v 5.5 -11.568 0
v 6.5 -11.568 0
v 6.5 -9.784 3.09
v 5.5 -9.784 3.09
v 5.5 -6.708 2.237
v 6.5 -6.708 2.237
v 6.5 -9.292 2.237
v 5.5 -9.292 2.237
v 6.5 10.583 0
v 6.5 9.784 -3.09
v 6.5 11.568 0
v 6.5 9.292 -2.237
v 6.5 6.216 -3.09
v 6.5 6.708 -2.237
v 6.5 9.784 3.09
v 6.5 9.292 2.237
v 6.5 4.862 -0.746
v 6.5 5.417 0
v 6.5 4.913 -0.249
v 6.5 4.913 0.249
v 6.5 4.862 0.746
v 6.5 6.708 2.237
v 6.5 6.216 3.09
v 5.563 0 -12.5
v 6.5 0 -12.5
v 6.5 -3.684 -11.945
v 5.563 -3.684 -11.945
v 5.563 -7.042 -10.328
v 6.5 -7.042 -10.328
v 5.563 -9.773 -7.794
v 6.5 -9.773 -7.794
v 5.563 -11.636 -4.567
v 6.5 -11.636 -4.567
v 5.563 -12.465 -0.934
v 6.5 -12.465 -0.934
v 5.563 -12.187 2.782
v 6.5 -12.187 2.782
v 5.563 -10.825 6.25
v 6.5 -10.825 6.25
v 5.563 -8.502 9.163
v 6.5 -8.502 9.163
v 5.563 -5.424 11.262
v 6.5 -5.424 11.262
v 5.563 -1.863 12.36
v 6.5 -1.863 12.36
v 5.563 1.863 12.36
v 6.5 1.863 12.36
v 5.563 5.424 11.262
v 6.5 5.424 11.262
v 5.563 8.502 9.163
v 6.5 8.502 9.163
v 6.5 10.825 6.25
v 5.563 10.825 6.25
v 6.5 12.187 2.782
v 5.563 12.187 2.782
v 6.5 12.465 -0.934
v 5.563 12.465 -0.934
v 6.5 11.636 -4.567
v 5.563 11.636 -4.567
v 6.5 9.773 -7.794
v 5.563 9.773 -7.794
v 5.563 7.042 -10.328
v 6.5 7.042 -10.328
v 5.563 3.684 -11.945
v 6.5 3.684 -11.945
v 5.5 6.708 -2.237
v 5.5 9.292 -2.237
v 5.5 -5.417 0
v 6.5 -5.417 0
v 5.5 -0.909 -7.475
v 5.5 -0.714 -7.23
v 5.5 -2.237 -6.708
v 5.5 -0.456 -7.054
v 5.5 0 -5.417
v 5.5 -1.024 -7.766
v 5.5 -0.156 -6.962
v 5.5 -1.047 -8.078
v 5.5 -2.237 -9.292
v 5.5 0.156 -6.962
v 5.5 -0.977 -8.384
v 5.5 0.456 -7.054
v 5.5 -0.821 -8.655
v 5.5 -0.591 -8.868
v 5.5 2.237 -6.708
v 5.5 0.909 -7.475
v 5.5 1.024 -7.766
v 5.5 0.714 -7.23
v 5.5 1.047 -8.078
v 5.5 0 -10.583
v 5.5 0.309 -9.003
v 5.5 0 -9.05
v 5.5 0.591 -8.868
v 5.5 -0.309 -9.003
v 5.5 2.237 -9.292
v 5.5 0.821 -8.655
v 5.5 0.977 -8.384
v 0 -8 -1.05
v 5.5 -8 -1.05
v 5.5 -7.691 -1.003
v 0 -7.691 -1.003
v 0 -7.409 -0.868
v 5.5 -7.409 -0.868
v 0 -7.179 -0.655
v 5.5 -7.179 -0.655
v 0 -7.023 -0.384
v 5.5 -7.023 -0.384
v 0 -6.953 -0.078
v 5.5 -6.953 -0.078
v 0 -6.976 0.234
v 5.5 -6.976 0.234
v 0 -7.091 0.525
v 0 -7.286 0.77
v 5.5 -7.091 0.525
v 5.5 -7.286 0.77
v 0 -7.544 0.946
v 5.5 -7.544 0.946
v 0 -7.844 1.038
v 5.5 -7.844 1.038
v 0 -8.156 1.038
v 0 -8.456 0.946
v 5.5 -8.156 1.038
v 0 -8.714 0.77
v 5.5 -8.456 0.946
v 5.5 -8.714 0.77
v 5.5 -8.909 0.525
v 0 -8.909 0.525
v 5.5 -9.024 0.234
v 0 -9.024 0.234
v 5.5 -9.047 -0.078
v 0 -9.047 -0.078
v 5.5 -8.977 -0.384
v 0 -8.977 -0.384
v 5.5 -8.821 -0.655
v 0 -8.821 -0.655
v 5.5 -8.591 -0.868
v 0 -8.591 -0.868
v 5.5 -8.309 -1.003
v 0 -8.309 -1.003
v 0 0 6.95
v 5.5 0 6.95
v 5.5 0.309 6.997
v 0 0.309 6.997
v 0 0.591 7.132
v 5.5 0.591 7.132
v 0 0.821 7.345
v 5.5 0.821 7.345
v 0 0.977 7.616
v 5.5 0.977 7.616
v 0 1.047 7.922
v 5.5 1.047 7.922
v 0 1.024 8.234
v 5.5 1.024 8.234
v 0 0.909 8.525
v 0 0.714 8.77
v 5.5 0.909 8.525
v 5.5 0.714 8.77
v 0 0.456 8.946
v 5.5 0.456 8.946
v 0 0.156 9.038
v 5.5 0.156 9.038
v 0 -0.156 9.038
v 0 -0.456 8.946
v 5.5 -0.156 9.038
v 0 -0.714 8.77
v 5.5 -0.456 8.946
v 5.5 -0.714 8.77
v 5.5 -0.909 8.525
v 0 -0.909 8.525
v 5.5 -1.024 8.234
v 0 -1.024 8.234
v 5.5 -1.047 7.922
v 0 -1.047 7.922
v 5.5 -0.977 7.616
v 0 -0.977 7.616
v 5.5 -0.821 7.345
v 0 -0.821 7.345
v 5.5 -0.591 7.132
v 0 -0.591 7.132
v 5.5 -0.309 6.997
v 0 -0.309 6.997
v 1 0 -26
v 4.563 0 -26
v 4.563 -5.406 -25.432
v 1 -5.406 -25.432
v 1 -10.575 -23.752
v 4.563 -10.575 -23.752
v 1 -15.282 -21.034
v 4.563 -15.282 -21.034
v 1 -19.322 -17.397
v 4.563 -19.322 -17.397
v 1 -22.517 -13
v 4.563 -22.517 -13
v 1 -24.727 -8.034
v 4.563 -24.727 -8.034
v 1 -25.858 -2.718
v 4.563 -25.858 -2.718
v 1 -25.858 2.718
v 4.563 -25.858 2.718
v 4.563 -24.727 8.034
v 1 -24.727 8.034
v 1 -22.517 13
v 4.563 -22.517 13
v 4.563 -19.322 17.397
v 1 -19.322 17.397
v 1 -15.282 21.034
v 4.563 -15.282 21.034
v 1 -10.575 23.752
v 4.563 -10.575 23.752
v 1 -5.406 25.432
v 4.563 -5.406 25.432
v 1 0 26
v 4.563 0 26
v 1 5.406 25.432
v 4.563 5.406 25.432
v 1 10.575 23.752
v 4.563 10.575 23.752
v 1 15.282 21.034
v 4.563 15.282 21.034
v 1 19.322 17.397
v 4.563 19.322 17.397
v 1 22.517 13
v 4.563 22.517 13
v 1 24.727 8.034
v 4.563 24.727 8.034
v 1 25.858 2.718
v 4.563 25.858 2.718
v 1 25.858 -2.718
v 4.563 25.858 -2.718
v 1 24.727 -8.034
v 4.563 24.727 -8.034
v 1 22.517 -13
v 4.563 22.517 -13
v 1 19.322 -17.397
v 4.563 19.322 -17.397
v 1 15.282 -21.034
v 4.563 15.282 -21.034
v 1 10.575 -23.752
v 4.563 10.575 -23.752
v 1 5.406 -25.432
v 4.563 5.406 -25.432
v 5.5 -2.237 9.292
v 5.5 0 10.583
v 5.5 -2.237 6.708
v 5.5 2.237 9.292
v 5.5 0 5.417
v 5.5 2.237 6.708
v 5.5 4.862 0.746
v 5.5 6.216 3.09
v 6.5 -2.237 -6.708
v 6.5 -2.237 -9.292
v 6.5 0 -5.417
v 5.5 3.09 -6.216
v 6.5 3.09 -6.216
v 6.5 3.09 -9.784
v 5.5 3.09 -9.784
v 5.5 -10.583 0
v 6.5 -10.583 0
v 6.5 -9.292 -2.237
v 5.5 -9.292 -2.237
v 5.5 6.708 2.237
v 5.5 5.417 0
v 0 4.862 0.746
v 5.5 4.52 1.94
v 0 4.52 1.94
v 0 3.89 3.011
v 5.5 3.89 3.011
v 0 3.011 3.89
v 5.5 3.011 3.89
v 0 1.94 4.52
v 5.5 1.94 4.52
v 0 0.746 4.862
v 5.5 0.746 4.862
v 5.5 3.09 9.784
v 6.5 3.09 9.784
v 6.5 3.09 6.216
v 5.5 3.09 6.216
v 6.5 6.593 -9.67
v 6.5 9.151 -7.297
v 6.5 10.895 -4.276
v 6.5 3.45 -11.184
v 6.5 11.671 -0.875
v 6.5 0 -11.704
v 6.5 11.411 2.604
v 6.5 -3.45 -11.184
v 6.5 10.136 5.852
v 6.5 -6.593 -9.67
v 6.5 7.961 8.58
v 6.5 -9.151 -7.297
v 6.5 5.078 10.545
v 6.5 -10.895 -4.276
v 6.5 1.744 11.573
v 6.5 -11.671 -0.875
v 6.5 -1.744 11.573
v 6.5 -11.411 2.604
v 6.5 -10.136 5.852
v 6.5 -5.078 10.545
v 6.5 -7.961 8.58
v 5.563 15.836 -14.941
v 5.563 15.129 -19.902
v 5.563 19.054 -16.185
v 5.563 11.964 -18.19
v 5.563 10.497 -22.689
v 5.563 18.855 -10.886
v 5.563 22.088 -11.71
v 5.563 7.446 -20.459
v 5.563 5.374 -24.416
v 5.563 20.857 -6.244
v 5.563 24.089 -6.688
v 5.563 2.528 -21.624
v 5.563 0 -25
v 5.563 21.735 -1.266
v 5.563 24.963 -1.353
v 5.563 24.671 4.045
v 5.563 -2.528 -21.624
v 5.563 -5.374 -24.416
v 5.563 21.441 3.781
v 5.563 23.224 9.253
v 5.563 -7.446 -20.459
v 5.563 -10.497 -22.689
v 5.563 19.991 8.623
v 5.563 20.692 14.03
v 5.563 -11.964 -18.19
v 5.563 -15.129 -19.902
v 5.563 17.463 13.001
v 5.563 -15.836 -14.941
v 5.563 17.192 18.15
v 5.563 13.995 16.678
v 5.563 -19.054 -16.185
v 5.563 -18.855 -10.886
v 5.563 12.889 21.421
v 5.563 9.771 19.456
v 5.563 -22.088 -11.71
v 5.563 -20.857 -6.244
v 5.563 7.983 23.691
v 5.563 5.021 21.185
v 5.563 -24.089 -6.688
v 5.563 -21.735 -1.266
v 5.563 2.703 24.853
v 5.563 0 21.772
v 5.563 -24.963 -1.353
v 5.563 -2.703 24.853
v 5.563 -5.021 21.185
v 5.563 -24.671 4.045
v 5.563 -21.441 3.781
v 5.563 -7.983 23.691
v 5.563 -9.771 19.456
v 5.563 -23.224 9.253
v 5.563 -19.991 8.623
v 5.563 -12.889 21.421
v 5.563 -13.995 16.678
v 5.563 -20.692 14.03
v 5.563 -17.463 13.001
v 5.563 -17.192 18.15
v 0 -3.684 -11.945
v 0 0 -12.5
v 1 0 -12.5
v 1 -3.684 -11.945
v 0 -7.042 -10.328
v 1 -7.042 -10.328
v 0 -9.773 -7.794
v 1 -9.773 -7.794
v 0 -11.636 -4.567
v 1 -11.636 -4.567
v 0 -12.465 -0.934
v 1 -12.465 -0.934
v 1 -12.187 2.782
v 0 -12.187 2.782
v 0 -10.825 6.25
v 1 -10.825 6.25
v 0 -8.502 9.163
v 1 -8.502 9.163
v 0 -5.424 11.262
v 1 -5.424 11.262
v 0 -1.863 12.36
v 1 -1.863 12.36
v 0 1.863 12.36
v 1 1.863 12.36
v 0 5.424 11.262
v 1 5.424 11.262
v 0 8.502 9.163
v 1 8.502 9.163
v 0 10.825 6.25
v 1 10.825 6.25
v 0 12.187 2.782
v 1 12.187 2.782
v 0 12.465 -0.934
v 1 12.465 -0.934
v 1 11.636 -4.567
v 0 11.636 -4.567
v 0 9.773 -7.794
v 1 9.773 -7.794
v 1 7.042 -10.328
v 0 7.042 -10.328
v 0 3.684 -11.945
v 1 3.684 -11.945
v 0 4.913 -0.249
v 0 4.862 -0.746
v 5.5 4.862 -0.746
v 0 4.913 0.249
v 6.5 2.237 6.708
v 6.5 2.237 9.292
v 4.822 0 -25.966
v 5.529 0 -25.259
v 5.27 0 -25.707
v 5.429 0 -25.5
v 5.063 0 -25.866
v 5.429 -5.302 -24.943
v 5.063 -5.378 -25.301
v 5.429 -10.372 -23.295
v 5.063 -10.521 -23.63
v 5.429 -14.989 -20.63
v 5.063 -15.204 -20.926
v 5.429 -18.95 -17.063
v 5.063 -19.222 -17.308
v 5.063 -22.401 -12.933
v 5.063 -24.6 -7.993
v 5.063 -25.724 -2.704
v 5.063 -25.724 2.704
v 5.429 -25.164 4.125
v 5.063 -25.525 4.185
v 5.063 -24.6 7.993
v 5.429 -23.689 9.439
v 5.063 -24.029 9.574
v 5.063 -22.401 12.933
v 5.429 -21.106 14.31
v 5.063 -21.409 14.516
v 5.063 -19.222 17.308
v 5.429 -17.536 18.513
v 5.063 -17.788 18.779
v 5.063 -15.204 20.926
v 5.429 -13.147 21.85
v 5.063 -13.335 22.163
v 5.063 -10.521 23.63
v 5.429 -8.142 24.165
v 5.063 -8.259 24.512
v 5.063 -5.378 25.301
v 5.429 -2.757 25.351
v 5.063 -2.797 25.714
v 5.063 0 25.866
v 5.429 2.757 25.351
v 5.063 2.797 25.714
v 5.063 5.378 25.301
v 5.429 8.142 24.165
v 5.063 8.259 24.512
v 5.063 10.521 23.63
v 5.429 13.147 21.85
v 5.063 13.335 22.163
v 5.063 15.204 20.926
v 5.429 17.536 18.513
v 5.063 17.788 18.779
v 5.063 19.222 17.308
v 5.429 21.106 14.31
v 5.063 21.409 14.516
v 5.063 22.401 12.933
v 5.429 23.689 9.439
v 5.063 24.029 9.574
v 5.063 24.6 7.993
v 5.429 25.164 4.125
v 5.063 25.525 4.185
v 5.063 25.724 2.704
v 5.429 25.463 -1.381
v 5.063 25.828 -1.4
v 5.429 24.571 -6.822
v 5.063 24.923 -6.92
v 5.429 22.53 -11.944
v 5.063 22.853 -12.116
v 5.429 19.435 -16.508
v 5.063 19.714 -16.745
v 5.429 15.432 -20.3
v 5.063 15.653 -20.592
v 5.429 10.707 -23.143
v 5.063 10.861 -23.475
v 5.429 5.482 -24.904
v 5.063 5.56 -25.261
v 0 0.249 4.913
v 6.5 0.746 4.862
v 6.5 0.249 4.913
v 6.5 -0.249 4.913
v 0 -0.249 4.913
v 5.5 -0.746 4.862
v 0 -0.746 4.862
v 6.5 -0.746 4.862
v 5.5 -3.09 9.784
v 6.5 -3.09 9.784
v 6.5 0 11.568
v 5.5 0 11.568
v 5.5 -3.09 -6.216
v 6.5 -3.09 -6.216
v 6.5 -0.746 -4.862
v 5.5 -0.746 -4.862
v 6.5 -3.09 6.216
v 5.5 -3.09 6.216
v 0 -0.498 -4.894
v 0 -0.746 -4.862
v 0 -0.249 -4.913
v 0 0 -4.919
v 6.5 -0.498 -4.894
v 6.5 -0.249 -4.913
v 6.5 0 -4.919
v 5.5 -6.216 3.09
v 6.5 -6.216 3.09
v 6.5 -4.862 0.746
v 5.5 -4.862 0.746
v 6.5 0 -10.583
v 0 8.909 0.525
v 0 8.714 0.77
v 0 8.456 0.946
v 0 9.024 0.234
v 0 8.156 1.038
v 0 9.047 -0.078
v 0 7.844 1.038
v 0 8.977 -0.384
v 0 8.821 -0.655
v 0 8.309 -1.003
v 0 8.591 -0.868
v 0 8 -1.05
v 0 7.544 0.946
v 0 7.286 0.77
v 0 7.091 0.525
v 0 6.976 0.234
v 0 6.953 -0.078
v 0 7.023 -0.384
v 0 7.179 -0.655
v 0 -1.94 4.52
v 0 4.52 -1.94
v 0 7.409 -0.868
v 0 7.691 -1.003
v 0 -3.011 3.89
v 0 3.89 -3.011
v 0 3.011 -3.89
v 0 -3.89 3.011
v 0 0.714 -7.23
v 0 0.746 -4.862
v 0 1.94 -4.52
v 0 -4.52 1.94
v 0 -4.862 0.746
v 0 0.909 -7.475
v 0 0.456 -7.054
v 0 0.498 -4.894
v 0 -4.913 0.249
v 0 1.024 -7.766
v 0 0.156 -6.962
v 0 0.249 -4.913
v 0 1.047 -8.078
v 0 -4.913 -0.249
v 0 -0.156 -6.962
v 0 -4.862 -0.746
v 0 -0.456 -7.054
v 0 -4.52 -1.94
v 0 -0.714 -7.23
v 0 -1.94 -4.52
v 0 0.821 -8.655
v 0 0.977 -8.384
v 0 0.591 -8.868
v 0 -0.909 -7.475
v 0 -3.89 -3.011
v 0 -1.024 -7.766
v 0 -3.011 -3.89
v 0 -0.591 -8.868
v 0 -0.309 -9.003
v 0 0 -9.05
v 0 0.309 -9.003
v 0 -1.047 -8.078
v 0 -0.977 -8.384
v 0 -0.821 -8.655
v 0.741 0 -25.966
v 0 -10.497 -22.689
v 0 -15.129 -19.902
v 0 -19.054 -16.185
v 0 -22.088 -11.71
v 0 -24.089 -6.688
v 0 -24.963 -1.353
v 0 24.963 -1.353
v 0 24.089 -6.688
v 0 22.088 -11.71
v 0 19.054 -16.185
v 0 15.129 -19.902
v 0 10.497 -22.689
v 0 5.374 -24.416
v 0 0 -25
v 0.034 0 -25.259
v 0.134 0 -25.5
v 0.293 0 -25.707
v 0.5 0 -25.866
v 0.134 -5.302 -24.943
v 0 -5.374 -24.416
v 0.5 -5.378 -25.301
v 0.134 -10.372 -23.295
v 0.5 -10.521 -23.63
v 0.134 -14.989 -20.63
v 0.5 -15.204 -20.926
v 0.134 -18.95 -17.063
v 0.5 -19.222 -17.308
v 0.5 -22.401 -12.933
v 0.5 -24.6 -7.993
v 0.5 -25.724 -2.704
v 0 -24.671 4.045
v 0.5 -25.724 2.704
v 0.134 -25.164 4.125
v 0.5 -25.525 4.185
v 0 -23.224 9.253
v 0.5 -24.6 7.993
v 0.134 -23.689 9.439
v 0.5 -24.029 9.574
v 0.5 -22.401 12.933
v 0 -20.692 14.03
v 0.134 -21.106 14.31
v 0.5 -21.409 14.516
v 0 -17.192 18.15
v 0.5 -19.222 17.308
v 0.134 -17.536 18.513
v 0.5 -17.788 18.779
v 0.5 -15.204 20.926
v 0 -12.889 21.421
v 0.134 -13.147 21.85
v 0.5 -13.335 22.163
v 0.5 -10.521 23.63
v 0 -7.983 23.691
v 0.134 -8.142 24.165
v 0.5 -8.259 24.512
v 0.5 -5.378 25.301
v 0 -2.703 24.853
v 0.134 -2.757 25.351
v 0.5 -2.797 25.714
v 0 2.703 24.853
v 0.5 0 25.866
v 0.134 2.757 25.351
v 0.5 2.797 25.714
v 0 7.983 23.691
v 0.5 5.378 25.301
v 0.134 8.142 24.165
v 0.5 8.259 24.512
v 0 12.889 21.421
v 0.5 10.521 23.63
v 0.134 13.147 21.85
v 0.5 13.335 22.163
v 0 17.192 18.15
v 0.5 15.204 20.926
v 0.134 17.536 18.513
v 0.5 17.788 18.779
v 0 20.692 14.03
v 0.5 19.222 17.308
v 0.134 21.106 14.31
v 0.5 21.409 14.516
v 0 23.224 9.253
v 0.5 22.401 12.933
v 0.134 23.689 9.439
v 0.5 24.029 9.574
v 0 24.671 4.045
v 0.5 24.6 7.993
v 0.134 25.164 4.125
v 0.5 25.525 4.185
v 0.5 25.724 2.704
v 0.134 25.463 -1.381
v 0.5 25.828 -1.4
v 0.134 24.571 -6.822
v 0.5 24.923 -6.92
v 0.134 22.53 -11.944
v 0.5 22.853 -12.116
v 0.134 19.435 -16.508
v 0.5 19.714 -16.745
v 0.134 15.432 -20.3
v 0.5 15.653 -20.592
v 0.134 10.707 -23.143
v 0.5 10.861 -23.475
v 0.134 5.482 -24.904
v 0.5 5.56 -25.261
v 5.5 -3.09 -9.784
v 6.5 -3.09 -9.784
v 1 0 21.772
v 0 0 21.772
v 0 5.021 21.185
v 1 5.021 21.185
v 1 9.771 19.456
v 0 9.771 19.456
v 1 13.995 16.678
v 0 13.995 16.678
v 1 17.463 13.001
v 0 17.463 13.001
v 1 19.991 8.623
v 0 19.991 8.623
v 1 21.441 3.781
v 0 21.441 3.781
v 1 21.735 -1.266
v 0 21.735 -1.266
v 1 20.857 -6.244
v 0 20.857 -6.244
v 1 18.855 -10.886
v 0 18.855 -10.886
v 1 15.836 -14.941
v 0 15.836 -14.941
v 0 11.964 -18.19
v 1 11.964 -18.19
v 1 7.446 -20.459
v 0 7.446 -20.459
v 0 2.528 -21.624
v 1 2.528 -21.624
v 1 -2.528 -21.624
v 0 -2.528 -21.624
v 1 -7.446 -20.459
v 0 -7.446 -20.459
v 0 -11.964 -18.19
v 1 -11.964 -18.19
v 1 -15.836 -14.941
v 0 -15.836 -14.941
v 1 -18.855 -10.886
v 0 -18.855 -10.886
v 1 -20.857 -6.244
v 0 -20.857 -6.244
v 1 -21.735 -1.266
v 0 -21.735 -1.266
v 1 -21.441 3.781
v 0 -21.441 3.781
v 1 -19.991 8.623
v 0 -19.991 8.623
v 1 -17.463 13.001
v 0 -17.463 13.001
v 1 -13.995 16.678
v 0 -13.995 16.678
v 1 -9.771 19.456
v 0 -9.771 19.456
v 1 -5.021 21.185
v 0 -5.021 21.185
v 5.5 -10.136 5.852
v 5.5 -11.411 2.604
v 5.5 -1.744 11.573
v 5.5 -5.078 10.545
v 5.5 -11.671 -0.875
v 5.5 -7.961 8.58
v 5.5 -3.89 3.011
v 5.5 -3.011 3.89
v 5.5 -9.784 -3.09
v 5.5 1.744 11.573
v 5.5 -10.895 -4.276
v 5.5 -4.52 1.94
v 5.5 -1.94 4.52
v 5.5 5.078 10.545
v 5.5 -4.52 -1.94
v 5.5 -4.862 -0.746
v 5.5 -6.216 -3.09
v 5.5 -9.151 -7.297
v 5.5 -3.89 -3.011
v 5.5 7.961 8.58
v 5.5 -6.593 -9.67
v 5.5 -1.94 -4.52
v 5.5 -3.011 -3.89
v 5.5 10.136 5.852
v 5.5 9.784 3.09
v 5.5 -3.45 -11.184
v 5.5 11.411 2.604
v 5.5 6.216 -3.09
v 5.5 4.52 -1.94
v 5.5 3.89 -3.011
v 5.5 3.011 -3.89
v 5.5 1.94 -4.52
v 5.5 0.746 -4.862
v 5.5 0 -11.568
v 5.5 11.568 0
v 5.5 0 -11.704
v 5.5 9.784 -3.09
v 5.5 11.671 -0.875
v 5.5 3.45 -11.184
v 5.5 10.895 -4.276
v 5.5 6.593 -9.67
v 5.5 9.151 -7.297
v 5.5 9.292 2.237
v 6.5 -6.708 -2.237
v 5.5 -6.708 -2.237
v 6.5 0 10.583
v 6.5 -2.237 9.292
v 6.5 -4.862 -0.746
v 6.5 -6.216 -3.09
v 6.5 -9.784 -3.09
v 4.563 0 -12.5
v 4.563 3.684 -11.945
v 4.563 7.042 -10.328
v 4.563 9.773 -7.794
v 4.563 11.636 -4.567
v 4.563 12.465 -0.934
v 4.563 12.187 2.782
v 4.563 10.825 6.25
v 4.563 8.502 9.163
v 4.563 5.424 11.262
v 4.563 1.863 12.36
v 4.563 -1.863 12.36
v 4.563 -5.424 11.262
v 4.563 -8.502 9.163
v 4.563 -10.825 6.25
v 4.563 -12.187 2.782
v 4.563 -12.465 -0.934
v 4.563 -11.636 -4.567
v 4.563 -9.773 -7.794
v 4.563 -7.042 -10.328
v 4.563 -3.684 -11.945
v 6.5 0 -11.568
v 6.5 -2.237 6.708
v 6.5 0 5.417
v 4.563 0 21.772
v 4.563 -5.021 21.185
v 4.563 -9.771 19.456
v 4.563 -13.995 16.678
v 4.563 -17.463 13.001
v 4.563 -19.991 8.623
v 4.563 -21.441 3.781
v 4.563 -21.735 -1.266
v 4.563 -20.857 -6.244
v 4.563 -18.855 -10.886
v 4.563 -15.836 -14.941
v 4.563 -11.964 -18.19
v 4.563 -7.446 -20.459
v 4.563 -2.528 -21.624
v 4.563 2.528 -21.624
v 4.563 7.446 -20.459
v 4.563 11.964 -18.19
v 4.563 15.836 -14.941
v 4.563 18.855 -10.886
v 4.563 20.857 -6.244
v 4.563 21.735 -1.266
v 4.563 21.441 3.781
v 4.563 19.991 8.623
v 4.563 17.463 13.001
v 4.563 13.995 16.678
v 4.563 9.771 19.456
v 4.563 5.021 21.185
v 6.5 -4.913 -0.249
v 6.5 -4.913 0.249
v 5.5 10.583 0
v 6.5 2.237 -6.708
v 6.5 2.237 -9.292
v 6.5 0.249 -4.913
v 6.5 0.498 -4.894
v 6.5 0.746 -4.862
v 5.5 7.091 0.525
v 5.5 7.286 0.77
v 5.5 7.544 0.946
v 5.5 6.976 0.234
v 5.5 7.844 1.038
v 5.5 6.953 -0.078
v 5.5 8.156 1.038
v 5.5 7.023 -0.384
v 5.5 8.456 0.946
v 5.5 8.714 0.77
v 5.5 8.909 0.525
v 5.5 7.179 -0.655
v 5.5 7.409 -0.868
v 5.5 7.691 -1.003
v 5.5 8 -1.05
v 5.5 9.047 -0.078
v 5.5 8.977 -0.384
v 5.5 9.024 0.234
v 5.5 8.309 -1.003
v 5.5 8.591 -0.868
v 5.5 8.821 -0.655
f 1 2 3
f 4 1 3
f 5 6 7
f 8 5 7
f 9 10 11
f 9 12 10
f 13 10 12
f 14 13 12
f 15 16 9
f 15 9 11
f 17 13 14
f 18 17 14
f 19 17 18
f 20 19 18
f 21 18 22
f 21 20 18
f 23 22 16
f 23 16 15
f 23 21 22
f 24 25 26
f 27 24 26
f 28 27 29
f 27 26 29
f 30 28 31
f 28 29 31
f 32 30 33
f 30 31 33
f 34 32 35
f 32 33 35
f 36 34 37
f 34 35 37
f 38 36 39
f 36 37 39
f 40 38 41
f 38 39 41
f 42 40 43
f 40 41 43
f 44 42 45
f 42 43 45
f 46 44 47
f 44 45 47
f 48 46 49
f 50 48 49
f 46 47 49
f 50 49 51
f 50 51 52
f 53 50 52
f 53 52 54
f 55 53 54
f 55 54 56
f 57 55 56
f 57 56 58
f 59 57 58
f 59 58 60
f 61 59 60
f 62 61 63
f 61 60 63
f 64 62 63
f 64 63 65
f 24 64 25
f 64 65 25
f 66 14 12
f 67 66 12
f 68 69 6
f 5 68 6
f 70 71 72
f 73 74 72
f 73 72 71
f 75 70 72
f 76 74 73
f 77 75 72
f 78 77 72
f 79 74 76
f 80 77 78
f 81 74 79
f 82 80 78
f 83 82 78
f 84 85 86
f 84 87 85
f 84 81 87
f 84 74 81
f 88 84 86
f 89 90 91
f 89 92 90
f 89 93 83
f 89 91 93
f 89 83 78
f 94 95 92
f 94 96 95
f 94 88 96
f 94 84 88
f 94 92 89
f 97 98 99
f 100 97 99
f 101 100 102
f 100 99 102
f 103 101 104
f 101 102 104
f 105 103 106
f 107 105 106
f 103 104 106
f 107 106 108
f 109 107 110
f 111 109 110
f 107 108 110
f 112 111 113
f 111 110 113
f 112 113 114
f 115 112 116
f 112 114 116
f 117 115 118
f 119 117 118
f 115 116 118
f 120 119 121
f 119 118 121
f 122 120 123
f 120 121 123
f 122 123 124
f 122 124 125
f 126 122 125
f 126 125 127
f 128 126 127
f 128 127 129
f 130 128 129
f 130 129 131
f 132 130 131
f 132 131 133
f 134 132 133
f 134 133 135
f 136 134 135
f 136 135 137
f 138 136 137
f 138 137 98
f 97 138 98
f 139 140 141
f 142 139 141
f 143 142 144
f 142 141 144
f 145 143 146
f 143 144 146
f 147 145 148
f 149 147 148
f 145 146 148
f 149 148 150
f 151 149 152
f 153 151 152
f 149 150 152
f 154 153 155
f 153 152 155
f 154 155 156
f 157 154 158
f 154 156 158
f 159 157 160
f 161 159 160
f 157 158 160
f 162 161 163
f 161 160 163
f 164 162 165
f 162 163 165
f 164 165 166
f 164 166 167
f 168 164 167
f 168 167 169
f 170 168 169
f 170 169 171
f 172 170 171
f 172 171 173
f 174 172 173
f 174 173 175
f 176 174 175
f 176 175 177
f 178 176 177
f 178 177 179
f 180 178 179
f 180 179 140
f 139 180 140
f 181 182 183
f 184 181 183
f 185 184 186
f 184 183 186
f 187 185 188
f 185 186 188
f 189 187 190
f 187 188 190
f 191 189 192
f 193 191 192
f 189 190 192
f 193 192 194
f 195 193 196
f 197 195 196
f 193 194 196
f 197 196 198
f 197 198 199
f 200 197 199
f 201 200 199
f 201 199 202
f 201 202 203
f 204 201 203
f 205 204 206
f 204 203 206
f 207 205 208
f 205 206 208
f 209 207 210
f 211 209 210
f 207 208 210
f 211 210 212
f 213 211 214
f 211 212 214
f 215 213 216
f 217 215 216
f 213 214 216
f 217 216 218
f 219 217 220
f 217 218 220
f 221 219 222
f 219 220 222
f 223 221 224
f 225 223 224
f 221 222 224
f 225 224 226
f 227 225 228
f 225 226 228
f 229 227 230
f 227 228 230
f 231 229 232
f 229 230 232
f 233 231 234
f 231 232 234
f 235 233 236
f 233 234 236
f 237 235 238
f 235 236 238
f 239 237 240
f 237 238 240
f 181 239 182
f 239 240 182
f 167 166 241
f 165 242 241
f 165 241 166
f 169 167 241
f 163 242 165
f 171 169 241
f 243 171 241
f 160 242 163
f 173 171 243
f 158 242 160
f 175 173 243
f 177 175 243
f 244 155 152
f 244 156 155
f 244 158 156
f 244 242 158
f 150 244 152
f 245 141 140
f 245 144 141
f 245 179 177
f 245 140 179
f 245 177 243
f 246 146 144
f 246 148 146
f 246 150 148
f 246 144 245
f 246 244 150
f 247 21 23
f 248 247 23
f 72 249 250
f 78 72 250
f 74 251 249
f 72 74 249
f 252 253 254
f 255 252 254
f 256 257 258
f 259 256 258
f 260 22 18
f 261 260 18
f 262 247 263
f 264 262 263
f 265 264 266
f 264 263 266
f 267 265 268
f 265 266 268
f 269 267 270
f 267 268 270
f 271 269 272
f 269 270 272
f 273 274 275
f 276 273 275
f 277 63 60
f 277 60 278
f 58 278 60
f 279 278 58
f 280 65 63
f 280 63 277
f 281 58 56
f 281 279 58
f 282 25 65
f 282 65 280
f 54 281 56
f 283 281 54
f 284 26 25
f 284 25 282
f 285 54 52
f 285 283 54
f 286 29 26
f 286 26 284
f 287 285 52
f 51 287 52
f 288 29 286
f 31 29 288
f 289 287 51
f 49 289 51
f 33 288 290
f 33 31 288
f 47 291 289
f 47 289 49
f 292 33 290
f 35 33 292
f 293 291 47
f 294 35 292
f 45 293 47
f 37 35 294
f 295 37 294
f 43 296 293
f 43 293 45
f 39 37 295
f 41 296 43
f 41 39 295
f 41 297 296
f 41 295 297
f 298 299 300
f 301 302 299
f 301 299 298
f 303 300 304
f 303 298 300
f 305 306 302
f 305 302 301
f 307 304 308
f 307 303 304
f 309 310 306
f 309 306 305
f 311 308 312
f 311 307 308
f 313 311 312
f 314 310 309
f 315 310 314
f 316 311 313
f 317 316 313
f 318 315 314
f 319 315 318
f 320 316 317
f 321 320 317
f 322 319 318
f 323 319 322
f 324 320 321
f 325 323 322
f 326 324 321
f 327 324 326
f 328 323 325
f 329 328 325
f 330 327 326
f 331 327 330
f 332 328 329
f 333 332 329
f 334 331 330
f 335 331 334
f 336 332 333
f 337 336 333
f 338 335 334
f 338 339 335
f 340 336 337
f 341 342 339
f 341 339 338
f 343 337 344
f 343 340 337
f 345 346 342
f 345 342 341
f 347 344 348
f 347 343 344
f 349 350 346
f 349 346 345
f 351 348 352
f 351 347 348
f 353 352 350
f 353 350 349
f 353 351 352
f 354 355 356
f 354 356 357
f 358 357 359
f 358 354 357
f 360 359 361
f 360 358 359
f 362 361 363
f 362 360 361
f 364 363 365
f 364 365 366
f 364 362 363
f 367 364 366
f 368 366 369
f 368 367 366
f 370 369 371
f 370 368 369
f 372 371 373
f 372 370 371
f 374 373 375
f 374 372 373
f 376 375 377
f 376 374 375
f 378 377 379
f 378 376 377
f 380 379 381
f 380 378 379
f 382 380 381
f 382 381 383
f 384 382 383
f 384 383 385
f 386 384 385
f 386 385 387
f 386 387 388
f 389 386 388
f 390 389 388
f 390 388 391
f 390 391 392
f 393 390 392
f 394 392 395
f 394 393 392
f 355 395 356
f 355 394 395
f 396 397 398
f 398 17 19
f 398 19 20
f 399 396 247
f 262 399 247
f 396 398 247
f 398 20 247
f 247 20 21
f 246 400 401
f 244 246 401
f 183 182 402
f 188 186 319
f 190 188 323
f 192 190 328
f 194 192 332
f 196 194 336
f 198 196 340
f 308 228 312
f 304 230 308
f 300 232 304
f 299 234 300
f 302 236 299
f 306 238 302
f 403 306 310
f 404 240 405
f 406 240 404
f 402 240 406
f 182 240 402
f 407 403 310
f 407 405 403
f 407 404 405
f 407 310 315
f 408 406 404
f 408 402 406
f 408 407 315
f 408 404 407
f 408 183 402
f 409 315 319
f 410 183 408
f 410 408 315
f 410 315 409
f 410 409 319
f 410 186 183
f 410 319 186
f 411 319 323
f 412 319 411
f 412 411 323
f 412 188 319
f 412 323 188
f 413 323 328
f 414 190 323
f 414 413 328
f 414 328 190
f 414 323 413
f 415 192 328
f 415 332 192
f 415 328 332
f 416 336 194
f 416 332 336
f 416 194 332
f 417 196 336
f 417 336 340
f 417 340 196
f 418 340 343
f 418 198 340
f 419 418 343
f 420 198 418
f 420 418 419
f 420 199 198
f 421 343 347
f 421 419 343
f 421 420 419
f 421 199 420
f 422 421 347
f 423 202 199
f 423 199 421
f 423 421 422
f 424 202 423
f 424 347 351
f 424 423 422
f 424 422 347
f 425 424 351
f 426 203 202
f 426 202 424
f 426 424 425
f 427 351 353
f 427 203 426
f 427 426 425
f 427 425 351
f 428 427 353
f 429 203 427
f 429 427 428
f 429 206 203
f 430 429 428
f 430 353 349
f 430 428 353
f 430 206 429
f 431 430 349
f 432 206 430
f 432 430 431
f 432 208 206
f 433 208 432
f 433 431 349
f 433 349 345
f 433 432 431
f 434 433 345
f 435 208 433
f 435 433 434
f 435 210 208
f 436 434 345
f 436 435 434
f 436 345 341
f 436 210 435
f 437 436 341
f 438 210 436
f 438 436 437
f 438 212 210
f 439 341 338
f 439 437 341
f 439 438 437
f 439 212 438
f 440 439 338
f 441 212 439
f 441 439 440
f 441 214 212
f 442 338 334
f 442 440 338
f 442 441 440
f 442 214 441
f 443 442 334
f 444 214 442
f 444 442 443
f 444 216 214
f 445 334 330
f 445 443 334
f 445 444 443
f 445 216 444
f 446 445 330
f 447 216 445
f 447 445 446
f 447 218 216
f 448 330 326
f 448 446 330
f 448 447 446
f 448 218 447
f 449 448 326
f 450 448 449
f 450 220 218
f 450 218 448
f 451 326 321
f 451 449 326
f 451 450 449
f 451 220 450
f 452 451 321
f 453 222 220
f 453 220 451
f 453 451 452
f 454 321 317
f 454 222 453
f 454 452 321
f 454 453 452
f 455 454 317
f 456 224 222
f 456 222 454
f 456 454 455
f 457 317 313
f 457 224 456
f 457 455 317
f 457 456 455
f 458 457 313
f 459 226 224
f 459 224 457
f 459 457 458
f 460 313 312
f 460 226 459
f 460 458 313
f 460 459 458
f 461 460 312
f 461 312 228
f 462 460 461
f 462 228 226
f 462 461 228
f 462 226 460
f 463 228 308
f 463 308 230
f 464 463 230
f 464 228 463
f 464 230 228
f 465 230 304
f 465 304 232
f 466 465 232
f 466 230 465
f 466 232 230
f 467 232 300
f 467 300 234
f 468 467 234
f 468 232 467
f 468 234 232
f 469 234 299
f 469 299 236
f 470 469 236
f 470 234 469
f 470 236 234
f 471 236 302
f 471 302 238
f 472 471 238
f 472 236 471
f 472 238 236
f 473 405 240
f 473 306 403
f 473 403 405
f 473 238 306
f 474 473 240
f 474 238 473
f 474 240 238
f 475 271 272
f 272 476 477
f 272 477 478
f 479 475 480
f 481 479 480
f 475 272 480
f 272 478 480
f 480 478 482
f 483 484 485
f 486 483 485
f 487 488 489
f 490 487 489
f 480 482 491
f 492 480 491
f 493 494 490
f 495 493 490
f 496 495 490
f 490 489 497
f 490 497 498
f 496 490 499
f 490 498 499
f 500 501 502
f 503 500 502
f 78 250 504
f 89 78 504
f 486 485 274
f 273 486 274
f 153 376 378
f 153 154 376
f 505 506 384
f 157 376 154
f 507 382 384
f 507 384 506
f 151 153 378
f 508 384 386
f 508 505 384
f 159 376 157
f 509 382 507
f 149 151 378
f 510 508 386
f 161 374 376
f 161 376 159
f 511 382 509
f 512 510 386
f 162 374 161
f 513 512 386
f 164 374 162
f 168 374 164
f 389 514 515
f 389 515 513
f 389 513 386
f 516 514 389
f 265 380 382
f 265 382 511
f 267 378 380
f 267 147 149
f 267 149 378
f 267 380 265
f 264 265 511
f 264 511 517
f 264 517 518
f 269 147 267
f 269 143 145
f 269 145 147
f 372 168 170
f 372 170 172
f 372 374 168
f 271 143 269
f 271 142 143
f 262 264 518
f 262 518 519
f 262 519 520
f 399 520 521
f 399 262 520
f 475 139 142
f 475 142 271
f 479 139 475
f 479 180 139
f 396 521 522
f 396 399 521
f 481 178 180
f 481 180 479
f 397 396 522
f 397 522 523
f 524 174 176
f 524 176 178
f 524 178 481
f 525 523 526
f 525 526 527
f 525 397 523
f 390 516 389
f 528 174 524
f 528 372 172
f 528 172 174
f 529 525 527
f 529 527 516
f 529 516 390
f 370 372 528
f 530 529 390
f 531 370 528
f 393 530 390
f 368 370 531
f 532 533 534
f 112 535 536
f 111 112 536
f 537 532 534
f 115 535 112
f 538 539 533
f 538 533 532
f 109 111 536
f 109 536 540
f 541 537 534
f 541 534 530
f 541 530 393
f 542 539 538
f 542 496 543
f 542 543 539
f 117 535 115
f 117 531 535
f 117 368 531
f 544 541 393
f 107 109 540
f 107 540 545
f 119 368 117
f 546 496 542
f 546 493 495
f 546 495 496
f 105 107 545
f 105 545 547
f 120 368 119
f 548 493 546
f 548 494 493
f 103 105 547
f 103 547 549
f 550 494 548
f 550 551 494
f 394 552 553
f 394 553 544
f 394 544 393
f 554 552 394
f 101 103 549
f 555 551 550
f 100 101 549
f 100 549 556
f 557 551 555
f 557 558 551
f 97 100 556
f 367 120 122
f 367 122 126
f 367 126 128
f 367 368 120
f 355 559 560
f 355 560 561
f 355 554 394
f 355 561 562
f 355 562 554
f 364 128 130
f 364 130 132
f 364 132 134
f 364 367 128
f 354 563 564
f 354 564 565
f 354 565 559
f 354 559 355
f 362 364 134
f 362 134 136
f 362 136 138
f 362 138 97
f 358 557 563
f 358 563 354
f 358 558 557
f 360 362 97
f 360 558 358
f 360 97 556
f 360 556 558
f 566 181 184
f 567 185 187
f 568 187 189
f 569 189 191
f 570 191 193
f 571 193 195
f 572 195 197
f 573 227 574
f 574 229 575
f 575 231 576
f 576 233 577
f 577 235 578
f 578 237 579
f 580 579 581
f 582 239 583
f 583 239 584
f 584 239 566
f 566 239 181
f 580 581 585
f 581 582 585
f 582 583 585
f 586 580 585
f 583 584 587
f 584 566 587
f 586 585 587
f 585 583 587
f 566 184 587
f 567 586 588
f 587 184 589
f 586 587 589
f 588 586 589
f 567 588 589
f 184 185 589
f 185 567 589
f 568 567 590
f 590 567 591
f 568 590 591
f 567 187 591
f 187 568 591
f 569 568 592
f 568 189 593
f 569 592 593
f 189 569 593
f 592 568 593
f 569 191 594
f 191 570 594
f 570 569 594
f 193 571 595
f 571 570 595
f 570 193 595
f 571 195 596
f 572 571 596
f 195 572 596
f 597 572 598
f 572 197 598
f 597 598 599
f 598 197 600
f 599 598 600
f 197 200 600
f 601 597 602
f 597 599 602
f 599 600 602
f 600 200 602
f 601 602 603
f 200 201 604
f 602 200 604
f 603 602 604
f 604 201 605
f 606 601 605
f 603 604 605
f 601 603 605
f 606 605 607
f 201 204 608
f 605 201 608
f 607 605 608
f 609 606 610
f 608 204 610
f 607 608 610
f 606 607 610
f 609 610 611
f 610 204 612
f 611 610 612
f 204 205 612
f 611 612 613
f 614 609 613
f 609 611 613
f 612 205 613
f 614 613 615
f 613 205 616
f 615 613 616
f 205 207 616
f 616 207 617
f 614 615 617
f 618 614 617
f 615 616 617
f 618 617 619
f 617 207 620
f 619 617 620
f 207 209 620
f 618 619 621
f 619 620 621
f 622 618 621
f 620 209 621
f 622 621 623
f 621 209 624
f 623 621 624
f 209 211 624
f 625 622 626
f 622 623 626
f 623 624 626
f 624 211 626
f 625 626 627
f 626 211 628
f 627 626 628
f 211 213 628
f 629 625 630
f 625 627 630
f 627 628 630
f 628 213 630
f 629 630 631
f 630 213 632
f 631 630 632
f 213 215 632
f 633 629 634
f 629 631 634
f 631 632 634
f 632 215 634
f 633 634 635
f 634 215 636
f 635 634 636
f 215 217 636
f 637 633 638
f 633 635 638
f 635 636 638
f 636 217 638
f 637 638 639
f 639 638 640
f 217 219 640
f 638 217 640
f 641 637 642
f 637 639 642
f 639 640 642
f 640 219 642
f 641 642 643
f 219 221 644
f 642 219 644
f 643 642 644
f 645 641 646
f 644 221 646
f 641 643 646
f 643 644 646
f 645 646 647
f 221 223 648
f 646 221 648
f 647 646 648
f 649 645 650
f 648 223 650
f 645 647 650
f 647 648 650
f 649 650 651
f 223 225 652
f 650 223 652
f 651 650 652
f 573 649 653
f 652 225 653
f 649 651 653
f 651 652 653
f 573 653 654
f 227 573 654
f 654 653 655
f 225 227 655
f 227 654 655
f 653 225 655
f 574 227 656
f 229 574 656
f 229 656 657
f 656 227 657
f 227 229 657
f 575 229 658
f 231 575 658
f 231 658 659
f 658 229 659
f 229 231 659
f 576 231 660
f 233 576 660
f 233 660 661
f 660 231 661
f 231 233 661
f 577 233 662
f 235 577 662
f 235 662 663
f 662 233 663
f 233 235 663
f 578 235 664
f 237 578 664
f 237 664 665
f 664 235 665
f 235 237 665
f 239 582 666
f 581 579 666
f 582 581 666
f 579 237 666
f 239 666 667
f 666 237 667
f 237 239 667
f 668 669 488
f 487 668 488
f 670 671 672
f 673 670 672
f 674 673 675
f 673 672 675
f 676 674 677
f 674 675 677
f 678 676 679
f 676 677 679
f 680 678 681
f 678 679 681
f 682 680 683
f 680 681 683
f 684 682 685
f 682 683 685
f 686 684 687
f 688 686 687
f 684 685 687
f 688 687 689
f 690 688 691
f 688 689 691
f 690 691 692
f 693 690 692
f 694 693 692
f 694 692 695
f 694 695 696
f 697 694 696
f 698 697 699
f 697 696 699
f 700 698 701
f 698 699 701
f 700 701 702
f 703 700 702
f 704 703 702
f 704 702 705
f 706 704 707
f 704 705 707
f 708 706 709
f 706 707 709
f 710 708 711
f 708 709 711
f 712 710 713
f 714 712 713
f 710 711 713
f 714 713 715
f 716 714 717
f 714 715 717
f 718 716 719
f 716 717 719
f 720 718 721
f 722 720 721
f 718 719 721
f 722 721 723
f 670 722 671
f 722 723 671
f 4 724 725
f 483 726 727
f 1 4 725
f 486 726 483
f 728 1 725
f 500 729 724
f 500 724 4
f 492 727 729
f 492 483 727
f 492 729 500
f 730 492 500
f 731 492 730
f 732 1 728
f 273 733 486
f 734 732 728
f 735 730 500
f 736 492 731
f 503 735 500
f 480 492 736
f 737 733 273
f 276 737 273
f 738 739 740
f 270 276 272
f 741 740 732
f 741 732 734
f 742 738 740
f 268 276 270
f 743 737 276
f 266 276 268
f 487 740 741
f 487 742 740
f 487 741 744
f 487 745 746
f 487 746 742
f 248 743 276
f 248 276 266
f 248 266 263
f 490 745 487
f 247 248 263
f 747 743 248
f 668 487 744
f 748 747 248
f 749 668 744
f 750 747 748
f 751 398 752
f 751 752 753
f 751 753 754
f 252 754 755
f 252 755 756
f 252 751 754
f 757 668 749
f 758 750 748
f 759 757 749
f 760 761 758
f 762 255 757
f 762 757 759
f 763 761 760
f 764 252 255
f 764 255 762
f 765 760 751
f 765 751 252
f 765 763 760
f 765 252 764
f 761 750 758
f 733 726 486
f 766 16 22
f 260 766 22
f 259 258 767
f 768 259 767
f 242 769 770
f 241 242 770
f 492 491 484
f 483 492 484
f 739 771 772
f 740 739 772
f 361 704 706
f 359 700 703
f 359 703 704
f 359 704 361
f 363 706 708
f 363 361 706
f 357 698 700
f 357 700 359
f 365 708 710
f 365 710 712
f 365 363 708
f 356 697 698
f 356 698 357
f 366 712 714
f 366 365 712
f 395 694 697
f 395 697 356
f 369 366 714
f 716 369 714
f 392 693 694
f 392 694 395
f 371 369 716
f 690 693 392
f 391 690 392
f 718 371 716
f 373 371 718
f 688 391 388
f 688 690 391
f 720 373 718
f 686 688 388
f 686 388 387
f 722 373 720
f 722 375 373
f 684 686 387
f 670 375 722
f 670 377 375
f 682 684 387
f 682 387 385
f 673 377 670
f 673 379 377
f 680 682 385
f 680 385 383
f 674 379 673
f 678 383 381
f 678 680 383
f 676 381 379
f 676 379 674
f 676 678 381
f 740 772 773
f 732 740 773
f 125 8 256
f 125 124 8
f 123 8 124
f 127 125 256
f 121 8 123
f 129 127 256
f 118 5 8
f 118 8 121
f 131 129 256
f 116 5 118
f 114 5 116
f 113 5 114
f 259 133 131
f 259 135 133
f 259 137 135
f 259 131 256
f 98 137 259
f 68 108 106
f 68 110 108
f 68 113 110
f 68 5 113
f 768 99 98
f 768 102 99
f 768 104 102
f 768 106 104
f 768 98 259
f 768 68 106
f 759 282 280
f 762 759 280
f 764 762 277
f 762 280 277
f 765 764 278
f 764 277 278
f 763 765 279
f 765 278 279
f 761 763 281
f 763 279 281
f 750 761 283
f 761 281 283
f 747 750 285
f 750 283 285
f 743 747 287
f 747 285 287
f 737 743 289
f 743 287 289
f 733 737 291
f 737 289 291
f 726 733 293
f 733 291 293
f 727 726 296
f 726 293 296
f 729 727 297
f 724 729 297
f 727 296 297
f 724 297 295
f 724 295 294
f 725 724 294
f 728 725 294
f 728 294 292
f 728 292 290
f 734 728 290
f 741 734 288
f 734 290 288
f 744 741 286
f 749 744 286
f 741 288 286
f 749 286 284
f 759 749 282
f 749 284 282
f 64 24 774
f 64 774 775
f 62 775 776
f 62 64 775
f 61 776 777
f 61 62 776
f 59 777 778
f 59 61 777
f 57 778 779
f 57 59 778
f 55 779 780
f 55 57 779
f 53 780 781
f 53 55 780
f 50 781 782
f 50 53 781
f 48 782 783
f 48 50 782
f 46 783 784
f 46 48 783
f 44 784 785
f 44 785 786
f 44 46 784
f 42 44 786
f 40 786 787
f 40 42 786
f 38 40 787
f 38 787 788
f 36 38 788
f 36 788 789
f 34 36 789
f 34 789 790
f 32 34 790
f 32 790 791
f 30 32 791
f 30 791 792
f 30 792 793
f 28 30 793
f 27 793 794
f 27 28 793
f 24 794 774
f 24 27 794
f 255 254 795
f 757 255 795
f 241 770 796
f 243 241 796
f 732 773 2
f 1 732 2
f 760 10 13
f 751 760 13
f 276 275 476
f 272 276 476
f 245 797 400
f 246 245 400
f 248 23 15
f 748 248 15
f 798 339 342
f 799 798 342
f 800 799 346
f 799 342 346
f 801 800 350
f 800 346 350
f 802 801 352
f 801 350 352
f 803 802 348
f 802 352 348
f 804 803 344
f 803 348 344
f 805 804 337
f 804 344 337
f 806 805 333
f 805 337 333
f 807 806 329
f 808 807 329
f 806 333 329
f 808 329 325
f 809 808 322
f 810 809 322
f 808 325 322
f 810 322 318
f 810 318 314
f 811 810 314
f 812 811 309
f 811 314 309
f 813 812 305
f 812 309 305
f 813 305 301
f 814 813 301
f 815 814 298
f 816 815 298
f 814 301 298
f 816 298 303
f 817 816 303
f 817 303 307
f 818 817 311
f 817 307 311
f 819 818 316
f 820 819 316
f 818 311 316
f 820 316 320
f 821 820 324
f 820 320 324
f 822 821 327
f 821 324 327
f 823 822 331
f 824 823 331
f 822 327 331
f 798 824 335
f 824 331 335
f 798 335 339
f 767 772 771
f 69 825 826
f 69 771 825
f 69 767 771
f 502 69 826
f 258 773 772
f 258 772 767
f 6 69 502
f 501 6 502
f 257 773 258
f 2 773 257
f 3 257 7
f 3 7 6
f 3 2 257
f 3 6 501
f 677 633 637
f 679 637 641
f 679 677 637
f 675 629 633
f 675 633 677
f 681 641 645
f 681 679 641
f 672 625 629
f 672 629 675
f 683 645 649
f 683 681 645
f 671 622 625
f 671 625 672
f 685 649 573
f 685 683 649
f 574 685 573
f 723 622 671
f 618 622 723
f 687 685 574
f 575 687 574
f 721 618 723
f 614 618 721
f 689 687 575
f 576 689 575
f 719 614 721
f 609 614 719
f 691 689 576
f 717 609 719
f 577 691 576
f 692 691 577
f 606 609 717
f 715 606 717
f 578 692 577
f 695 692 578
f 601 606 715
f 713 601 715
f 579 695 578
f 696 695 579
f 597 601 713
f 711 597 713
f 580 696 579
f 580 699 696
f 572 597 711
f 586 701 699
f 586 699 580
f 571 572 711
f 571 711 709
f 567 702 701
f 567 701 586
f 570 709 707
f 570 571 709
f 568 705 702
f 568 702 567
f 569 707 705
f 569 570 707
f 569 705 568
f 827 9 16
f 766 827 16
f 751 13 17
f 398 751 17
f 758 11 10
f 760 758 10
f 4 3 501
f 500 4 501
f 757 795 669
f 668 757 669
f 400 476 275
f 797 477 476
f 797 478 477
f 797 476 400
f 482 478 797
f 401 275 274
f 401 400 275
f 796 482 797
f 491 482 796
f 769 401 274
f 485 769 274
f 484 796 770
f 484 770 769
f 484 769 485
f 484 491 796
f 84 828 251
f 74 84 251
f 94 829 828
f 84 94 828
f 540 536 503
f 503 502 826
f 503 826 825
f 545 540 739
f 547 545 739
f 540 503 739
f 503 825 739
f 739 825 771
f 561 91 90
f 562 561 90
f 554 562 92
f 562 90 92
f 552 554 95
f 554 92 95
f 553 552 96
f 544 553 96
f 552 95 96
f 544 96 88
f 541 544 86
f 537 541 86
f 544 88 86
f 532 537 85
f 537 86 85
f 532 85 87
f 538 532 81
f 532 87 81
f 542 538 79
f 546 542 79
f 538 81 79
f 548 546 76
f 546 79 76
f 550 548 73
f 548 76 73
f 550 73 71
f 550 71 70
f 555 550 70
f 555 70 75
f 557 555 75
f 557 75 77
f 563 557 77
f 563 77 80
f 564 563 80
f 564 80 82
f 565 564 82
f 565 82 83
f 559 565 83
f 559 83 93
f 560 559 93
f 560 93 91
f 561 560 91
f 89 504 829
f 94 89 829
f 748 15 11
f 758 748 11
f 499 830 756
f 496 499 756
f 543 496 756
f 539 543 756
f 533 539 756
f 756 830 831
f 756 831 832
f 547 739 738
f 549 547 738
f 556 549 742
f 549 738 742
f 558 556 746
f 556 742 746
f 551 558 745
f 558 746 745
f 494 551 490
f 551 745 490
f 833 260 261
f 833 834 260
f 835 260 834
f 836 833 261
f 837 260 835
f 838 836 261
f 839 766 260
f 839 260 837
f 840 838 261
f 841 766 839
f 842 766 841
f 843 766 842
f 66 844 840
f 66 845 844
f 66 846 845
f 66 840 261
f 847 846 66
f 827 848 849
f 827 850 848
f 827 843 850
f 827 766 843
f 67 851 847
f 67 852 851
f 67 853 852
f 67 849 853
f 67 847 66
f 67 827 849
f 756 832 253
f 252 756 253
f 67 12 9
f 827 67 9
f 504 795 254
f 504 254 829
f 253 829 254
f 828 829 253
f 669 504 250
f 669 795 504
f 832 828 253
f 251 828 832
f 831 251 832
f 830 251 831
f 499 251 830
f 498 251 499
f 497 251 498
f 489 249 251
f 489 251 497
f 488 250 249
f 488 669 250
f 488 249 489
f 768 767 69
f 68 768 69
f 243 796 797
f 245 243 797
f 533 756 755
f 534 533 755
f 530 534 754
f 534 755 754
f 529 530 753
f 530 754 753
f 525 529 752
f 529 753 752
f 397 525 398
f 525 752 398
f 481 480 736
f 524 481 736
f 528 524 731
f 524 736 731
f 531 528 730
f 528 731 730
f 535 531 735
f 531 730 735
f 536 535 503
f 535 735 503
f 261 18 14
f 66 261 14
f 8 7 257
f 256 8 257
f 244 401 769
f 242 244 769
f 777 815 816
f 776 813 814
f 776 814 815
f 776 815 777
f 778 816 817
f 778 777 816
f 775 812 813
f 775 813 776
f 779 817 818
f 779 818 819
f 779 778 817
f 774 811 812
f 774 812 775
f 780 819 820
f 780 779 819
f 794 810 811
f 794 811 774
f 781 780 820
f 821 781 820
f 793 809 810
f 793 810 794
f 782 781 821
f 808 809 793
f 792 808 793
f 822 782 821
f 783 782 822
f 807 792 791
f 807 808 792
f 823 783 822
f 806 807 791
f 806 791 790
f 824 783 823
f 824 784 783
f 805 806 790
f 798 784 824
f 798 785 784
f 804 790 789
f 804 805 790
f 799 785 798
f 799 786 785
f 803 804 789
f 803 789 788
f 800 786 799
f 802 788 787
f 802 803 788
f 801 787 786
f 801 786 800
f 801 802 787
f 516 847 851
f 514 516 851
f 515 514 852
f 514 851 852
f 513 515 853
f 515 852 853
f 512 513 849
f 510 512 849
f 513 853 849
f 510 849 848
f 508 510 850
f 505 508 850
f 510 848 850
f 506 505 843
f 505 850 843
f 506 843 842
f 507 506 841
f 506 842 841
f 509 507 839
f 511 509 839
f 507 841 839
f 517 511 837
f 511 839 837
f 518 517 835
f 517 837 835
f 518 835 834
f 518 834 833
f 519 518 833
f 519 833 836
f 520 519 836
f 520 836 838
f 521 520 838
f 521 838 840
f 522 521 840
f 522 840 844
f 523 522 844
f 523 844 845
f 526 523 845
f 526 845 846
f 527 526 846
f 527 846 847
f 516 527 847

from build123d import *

# Parameters (mm, degrees)
FILLET1_R          = 1
SKETCH2_R          = 11.704122172
SKETCH2_R_2        = 1.05
CUT_EXTRUDE1_DEPTH = 1
SKETCH2_3_R        = 4.91900138
SKETCH2_3_R_2      = 1.05
CUT_EXTRUDE2_DEPTH = 38.339657272
SKETCH3_R          = 21.771584826
SKETCH3_R_2        = 12.5
CUT_EXTRUDE3_DEPTH = 1
CUT_EXTRUDE4_START = -1
SKETCH4_R          = 21.771584826
SKETCH4_R_2        = 12.5
CUT_EXTRUDE4_DEPTH = 1


with BuildPart() as part:
    # Sketch1 → Revolve1 (revolve)
    with BuildSketch(Plane(origin=(0, 0, 0), x_dir=(1, 0, 0), z_dir=(0, 1, 0))):
        Polygon((0, 0), (6.5, 0), (6.5, 12.5), (5.563387429, 12.5), (5.563387429, 26), (0, 26), align=None)
    revolve(axis=Axis((6.5, 0, 0), (-1, 0, 0)))

    # Fillet1
    fillet1_edges = [part.edges().sort_by_distance(p)[0] for p in [
        (0, 0, 26),
        (5.563387429, 0, 26),
    ]]
    fillet(fillet1_edges, radius=FILLET1_R)

    # Sketch2 → Cut-Extrude1 (cut)
    # profile 1 of 5: a face of its own
    with BuildSketch(Plane(origin=(6.5, 0, 0), x_dir=(0, 0, -1), z_dir=(1, 0, 0))):
        Circle(SKETCH2_R)
        with BuildLine():
            Line((6.215873313, -3.090198068), (4.862176877, -0.745527062))
            ThreePointArc((4.862176877, -0.745527062), (3.478259233, -3.478259233), (0.745527062, -4.862176877))
            Line((0.745527062, -4.862176877), (3.090198068, -6.215873313))
            Line((3.090198068, -6.215873313), (3.090198068, -9.784126687))
            Line((3.090198068, -9.784126687), (0, -11.568253373))
            Line((0, -11.568253373), (-3.090198068, -9.784126687))
            Line((-3.090198068, -9.784126687), (-3.090198068, -6.215873313))
            Line((-3.090198068, -6.215873313), (-0.745527062, -4.862176877))
            ThreePointArc((-0.745527062, -4.862176877), (-3.478259233, -3.478259233), (-4.862176877, -0.745527062))
            Line((-4.862176877, -0.745527062), (-6.215873313, -3.090198068))
            Line((-6.215873313, -3.090198068), (-9.784126687, -3.090198068))
            Line((-9.784126687, -3.090198068), (-11.568253373, 0))
            Line((-11.568253373, 0), (-9.784126687, 3.090198068))
            Line((-9.784126687, 3.090198068), (-6.215873313, 3.090198068))
            Line((-6.215873313, 3.090198068), (-4.862176877, 0.745527062))
            ThreePointArc((-4.862176877, 0.745527062), (-3.478259233, 3.478259233), (-0.745527062, 4.862176877))
            Line((-0.745527062, 4.862176877), (-3.090198068, 6.215873313))
            Line((-3.090198068, 6.215873313), (-3.090198068, 9.784126687))
            Line((-3.090198068, 9.784126687), (0, 11.568253373))
            Line((0, 11.568253373), (3.090198068, 9.784126687))
            Line((3.090198068, 9.784126687), (3.090198068, 6.215873313))
            Line((3.090198068, 6.215873313), (0.745527062, 4.862176877))
            ThreePointArc((0.745527062, 4.862176877), (3.478259233, 3.478259233), (4.862176877, 0.745527062))
            Line((4.862176877, 0.745527062), (6.215873313, 3.090198068))
            Line((6.215873313, 3.090198068), (9.784126687, 3.090198068))
            Line((9.784126687, 3.090198068), (11.568253373, 0))
            Line((11.568253373, 0), (9.784126687, -3.090198068))
            Line((9.784126687, -3.090198068), (6.215873313, -3.090198068))
        make_face(mode=Mode.SUBTRACT)
    # profile 2 of 5: a face of its own
    with BuildSketch(Plane(origin=(6.5, 0, 0), x_dir=(0, 0, -1), z_dir=(1, 0, 0))):
        Polygon((-2.237316109, 6.708284942), (0, 5.416569884), (2.237316109, 6.708284942), (2.237316109, 9.291715058), (0, 10.583430116), (-2.237316109, 9.291715058), align=None)
        with Locations((0, 8)):
            Circle(SKETCH2_R_2, mode=Mode.SUBTRACT)
    # profile 3 of 5: a face of its own
    with BuildSketch(Plane(origin=(6.5, 0, 0), x_dir=(0, 0, -1), z_dir=(1, 0, 0))):
        Polygon((-6.708284942, -2.237316109), (-5.416569884, 0), (-6.708284942, 2.237316109), (-9.291715058, 2.237316109), (-10.583430116, 0), (-9.291715058, -2.237316109), align=None)
        with Locations((-8, 0)):
            Circle(SKETCH2_R_2, mode=Mode.SUBTRACT)
    # profile 4 of 5: a face of its own
    with BuildSketch(Plane(origin=(6.5, 0, 0), x_dir=(0, 0, -1), z_dir=(1, 0, 0))):
        Polygon((6.708284942, 2.237316109), (5.416569884, 0), (6.708284942, -2.237316109), (9.291715058, -2.237316109), (10.583430116, 0), (9.291715058, 2.237316109), align=None)
        with Locations((8, 0)):
            Circle(SKETCH2_R_2, mode=Mode.SUBTRACT)
    # profile 5 of 5: a face of its own
    with BuildSketch(Plane(origin=(6.5, 0, 0), x_dir=(0, 0, -1), z_dir=(1, 0, 0))):
        Polygon((2.237316109, -6.708284942), (0, -5.416569884), (-2.237316109, -6.708284942), (-2.237316109, -9.291715058), (0, -10.583430116), (2.237316109, -9.291715058), align=None)
        with Locations((0, -8)):
            Circle(SKETCH2_R_2, mode=Mode.SUBTRACT)
    extrude(amount=-CUT_EXTRUDE1_DEPTH, mode=Mode.SUBTRACT)

    # Sketch2<3> → Cut-Extrude2 (cut, through all)
    with BuildSketch(Plane(origin=(6.5, 0, 0), x_dir=(0, 0, -1), z_dir=(1, 0, 0))):
        Circle(SKETCH2_3_R)
        with Locations((8, 0)):
            Circle(SKETCH2_3_R_2)
        with Locations((0, -8)):
            Circle(SKETCH2_3_R_2)
        with Locations((-8, 0)):
            Circle(SKETCH2_3_R_2)
        with Locations((0, 8)):
            Circle(SKETCH2_3_R_2)
    extrude(amount=-CUT_EXTRUDE2_DEPTH, mode=Mode.SUBTRACT)

    # Sketch3 → Cut-Extrude3 (cut)
    with BuildSketch(Plane.ZY):
        Circle(SKETCH3_R)
        Circle(SKETCH3_R_2, mode=Mode.SUBTRACT)
    extrude(amount=-CUT_EXTRUDE3_DEPTH, mode=Mode.SUBTRACT)

    # Sketch4 → Cut-Extrude4 (cut)
    with BuildSketch(Plane(origin=(5.563387429, 0, 0), x_dir=(0, 0, -1), z_dir=(1, 0, 0)).offset(CUT_EXTRUDE4_START)):
        Circle(SKETCH4_R)
        Circle(SKETCH4_R_2, mode=Mode.SUBTRACT)
    extrude(amount=CUT_EXTRUDE4_DEPTH, mode=Mode.SUBTRACT)


solid = part.part
